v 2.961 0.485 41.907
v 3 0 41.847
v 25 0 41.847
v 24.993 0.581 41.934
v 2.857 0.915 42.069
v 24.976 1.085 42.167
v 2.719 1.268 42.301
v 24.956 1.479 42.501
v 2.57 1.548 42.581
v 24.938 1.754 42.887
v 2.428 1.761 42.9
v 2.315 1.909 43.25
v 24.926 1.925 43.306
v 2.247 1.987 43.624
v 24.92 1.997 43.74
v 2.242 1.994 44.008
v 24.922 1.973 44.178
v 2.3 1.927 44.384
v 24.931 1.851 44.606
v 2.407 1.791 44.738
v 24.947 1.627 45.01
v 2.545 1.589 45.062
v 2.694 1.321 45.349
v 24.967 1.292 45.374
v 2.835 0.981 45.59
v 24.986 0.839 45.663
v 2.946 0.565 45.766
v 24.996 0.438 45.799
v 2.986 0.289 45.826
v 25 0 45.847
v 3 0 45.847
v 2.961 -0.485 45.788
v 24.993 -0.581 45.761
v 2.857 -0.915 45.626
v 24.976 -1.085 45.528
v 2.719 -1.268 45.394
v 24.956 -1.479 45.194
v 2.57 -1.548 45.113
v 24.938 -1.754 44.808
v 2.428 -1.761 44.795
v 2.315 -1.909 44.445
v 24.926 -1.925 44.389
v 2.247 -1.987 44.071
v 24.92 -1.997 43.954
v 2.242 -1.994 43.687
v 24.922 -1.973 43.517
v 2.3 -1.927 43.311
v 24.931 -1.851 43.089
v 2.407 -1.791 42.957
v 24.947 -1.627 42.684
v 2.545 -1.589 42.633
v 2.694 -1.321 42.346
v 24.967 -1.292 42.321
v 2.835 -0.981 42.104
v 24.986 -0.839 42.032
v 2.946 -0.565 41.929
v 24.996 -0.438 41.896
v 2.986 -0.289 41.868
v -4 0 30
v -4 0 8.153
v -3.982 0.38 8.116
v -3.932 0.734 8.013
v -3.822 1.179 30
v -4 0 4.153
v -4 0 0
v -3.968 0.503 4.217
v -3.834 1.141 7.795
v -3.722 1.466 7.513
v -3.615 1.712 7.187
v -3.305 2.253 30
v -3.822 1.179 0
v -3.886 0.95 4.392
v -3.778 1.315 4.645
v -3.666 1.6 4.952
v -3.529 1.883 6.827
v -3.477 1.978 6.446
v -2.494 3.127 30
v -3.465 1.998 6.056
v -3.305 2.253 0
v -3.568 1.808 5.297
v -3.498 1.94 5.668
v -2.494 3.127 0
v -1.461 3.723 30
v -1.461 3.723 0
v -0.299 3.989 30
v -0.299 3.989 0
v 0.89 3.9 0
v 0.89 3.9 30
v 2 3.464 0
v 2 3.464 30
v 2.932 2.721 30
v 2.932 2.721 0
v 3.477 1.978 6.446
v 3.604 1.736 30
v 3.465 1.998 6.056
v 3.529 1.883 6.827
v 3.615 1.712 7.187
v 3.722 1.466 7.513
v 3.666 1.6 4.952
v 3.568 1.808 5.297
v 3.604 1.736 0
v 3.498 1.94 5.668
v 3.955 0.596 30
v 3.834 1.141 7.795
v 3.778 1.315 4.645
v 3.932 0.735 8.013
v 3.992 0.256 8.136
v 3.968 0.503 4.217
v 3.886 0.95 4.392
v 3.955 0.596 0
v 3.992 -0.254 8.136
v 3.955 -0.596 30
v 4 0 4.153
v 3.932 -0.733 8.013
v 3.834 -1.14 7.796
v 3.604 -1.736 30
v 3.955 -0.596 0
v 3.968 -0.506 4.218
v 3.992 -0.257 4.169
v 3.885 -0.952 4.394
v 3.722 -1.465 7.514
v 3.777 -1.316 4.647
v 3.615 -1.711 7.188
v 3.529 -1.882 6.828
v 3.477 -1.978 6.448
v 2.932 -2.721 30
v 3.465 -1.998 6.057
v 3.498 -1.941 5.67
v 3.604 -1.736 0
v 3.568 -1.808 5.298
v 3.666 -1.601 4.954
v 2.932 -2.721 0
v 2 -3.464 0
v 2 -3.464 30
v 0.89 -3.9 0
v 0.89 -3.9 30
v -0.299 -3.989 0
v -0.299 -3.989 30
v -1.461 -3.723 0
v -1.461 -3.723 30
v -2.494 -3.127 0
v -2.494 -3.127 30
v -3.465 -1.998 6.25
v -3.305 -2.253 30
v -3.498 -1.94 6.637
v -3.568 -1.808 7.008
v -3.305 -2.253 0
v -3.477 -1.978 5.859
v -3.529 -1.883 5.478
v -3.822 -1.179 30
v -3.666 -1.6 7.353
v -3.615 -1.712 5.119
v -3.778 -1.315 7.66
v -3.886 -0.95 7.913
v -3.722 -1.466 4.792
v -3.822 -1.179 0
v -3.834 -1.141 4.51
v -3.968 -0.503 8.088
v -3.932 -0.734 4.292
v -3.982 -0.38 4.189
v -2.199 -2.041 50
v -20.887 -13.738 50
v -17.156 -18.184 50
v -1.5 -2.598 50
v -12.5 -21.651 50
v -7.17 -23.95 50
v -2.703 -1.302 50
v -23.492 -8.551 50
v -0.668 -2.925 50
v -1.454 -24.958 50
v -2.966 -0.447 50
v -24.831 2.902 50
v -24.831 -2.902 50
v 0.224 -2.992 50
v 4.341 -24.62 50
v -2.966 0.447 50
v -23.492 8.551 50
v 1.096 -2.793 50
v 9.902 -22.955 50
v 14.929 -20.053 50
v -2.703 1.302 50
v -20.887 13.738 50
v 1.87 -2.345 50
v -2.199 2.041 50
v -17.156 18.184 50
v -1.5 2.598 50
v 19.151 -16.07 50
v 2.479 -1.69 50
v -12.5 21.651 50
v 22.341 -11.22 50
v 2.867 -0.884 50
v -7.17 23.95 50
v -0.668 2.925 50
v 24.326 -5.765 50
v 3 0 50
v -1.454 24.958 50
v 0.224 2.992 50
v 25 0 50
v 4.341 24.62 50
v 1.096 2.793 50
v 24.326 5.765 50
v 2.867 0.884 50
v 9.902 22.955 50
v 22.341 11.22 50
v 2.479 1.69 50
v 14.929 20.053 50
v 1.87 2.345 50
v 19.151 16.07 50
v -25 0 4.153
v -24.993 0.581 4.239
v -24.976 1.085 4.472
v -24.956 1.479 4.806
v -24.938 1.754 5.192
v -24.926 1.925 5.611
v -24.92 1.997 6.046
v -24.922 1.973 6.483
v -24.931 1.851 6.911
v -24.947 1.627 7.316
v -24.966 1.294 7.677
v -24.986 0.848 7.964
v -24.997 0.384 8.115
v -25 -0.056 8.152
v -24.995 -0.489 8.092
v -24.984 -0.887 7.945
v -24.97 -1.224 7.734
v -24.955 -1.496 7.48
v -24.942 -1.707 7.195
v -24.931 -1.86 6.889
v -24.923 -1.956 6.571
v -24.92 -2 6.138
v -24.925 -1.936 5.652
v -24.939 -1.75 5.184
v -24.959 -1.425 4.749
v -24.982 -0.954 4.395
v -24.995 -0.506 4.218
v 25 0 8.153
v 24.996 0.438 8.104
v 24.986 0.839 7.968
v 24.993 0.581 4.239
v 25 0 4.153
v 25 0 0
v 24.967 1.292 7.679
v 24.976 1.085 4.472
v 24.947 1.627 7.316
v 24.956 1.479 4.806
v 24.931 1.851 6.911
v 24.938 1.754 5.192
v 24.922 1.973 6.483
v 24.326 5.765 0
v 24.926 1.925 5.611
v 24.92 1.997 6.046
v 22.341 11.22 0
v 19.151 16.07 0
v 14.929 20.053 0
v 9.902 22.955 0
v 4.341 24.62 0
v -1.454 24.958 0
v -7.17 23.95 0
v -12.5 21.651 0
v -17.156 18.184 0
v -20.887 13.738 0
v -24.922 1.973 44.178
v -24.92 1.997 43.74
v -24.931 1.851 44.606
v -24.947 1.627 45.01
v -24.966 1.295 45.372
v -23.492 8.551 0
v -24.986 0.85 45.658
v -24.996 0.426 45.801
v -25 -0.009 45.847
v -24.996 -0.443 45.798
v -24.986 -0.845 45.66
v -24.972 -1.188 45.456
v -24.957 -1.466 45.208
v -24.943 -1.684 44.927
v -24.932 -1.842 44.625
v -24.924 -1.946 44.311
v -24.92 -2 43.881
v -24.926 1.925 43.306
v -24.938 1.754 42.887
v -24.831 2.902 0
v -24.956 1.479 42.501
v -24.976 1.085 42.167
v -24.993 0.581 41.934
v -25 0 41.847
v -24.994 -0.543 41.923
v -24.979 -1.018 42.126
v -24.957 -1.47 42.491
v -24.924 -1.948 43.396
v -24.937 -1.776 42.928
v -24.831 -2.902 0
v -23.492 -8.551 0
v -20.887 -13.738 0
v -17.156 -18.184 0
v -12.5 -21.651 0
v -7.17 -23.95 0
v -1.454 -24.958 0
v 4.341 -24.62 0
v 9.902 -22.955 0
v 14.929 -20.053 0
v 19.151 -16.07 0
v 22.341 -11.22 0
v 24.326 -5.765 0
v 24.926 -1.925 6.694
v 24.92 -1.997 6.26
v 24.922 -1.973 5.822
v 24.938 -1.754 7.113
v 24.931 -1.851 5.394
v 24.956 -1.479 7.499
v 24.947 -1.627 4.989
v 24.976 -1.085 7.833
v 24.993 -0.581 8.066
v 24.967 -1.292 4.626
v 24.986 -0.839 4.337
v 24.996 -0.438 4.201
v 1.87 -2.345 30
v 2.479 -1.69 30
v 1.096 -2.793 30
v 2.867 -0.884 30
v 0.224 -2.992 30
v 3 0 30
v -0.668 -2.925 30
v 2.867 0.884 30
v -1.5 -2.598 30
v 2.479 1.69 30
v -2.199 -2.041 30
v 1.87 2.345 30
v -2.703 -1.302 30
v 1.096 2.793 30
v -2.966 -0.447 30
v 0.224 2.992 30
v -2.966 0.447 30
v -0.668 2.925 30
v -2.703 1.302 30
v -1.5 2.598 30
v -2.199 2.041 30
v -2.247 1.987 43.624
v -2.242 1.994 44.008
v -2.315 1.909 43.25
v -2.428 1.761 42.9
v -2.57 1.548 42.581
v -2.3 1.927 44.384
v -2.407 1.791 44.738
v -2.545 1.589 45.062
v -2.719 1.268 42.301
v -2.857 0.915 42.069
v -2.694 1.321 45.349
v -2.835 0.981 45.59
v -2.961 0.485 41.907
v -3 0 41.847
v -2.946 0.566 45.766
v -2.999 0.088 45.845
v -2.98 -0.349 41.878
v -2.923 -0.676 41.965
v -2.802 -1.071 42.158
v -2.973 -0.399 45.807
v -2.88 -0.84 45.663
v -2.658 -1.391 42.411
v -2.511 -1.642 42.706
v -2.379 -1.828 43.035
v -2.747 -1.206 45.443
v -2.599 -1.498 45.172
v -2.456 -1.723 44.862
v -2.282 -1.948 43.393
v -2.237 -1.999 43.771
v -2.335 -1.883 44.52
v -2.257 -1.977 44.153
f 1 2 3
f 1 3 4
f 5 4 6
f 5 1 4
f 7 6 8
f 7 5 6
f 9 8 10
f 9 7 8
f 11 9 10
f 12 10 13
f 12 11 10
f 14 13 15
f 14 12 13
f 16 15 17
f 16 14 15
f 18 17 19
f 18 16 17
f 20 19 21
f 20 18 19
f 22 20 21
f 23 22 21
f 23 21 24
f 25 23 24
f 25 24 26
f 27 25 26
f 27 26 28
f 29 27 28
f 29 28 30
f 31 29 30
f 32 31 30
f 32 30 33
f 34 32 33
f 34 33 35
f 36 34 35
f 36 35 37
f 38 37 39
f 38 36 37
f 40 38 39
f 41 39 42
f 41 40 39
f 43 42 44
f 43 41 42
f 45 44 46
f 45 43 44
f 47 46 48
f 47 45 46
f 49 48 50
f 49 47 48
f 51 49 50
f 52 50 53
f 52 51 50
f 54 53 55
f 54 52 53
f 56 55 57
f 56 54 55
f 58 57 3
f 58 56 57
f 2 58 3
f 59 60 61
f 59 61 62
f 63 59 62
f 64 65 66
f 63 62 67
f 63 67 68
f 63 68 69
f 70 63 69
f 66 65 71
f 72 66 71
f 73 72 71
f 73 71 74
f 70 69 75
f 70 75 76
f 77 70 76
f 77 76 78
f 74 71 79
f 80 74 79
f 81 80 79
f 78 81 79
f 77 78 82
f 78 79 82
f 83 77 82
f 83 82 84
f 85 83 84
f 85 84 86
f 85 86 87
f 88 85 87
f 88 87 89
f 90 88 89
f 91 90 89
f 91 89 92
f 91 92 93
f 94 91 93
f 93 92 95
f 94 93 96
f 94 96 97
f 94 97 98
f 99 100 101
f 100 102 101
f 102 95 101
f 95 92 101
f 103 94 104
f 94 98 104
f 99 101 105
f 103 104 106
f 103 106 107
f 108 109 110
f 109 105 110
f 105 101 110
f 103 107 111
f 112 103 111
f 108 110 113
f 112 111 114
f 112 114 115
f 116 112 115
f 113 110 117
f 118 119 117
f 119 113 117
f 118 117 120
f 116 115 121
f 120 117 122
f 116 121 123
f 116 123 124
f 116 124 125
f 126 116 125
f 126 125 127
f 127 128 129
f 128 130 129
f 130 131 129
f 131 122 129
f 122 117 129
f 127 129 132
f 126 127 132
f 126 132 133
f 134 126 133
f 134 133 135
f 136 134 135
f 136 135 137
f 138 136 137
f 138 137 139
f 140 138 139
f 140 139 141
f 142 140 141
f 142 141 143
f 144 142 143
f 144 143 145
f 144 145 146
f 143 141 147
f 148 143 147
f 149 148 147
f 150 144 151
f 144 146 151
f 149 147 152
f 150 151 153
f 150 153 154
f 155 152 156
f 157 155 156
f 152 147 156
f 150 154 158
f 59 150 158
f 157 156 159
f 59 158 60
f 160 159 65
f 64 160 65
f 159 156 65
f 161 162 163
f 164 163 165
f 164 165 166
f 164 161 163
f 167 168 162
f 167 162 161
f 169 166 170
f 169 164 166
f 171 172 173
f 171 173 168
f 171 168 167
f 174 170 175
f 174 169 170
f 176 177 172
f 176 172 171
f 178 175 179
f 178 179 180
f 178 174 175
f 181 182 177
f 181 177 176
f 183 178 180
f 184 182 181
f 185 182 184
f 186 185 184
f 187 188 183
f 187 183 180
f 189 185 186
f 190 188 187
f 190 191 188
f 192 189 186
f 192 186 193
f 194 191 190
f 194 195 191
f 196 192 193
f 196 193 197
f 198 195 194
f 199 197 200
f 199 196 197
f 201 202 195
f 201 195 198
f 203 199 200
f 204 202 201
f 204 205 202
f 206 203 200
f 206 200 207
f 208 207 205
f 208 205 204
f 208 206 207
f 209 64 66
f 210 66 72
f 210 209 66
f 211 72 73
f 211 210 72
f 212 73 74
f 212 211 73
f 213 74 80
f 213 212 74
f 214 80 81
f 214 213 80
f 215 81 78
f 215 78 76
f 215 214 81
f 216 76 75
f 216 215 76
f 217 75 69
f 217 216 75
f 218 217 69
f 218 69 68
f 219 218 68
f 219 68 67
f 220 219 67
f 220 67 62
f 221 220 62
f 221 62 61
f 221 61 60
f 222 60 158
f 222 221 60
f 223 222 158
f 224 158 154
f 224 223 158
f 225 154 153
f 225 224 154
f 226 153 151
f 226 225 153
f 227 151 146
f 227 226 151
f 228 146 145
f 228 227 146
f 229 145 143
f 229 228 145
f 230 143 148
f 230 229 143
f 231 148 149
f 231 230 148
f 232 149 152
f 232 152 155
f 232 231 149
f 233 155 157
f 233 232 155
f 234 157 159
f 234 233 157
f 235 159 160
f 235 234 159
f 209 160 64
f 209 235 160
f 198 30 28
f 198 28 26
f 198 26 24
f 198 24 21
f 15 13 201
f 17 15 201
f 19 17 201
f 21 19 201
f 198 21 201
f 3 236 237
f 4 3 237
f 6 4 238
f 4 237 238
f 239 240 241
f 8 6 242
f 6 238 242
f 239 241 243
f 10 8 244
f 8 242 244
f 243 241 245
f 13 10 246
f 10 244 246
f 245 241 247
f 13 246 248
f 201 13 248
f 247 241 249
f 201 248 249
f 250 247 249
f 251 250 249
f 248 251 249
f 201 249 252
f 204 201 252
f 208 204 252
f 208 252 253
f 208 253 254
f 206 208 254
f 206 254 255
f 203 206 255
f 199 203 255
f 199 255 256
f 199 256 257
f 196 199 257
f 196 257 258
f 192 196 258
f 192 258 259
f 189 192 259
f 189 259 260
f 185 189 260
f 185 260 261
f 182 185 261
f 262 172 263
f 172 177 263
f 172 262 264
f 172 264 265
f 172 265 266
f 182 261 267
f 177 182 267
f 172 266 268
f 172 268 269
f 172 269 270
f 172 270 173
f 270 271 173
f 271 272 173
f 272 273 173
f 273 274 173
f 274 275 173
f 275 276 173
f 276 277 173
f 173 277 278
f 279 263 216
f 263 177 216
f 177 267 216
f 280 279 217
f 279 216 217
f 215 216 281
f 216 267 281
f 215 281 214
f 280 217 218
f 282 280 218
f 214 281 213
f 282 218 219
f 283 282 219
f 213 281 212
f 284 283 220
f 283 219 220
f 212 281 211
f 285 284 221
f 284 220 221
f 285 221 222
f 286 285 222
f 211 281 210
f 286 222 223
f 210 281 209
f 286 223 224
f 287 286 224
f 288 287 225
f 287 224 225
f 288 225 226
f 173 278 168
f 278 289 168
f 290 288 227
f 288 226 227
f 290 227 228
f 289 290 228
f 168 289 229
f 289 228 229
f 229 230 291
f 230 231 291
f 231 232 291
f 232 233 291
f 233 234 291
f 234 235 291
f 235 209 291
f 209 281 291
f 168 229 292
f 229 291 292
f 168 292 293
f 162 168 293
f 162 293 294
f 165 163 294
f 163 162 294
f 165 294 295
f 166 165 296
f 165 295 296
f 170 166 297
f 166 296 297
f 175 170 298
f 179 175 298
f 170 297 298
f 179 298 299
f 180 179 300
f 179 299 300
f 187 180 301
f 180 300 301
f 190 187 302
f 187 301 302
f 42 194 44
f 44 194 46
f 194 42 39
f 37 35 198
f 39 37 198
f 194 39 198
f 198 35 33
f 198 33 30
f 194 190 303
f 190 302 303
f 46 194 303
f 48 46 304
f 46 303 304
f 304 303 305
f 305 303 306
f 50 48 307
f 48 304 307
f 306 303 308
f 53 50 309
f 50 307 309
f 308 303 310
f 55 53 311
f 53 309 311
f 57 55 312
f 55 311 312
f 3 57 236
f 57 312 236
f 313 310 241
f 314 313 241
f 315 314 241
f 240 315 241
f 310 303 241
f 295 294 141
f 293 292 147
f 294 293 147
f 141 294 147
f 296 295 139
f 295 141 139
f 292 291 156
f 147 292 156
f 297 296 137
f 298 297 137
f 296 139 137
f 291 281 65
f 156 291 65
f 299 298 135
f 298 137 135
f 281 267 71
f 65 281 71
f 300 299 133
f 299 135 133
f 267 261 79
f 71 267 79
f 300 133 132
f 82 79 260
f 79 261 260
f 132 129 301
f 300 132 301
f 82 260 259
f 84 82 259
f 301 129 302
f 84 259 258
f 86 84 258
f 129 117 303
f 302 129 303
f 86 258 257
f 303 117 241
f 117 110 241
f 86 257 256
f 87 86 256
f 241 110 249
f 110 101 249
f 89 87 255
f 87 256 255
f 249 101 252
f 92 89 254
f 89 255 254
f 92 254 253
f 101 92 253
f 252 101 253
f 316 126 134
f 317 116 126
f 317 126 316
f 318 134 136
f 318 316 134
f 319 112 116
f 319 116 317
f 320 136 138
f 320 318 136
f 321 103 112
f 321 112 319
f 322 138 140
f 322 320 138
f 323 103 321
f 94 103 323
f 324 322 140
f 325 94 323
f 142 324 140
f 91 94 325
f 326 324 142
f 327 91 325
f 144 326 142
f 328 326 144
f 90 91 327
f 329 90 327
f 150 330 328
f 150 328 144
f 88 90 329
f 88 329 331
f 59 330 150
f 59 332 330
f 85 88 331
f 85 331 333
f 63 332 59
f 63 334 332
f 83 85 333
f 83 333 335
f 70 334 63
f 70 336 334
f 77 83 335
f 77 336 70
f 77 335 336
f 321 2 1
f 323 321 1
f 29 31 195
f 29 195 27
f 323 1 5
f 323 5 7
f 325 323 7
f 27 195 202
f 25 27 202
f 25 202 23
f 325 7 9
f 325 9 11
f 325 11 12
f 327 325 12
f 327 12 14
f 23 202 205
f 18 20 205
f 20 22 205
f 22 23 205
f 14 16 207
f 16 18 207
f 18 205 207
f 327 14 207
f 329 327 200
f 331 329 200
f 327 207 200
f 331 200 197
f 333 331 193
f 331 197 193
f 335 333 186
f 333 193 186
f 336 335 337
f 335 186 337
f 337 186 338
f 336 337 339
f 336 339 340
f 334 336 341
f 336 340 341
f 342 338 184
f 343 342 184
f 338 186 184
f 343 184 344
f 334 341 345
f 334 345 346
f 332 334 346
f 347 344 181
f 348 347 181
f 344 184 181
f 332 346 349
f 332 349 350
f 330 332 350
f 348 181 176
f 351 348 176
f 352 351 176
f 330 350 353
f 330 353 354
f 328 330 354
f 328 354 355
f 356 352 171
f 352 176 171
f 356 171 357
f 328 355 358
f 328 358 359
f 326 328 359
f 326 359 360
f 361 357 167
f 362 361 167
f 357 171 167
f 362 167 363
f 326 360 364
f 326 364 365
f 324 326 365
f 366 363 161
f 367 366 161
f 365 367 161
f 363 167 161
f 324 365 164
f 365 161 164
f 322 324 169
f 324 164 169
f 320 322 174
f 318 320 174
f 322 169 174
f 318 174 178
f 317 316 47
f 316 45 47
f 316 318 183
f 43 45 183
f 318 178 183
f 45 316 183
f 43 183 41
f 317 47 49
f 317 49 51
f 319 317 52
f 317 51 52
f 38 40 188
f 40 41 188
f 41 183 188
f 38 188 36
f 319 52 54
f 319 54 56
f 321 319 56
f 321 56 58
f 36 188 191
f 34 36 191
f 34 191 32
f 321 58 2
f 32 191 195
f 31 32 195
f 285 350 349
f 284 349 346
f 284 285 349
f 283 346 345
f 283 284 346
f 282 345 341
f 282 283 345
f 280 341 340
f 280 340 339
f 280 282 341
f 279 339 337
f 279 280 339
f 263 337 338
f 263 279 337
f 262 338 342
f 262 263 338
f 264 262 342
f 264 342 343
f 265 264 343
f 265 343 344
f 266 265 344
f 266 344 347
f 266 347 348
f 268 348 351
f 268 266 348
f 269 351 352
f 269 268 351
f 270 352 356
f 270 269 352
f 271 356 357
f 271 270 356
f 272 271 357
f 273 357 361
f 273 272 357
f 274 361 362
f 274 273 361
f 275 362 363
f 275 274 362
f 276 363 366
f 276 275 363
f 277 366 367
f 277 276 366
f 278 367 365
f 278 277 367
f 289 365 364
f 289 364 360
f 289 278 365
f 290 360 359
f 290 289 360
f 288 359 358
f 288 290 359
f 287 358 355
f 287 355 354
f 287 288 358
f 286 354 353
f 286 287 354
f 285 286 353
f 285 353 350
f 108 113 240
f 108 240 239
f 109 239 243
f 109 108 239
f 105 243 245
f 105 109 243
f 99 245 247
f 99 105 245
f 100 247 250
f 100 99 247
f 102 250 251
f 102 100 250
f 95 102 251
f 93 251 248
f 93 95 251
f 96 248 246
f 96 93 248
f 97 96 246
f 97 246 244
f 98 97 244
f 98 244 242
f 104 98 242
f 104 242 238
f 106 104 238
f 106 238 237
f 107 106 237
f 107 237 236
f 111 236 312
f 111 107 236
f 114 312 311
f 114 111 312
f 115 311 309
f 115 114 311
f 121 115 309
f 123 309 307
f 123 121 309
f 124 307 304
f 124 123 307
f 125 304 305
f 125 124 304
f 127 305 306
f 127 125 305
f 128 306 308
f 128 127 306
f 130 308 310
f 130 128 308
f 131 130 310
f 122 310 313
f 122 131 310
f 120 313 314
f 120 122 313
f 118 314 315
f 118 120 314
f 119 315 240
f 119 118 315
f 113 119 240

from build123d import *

# Parameters (mm, degrees)
SKETCH1_R               = 25
BOSS_EXTRUDE1_DEPTH     = 50
SKETCH2_R               = 3
CUT_EXTRUDE1_DEPTH      = 20
SKETCH3_R               = 4
CUT_EXTRUDE2_DEPTH      = 30
CUT_EXTRUDE3_DEPTH      = 62.23724357
CUT_EXTRUDE3_DEPTH_BACK = 62.23724357
SKETCH4_R               = 2


with BuildPart() as part:
    # Sketch1 → Boss-Extrude1 (new body)
    with BuildSketch(Plane.XY):
        Circle(SKETCH1_R)
    extrude(amount=BOSS_EXTRUDE1_DEPTH)

    # Sketch2 → Cut-Extrude1 (cut)
    with BuildSketch(Plane.XY.offset(50)):
        Circle(SKETCH2_R)
    extrude(amount=-CUT_EXTRUDE1_DEPTH, mode=Mode.SUBTRACT)

    # Sketch3 → Cut-Extrude2 (cut)
    with BuildSketch(Plane(origin=(0, 0, 0), x_dir=(-1, 0, 0), z_dir=(0, 0, -1))):
        Circle(SKETCH3_R)
    extrude(amount=-CUT_EXTRUDE2_DEPTH, mode=Mode.SUBTRACT)

    # Sketch4 → Cut-Extrude3 (cut, two sides: drawn at the far end of the back side and taken through both)
    with BuildSketch(Plane(origin=(0, 0, 0), x_dir=(0, 0, -1), z_dir=(1, 0, 0)).offset(-CUT_EXTRUDE3_DEPTH_BACK)):
        with Locations((-43.847378844, 0)):
            Circle(SKETCH4_R)
        with Locations((-6.152621156, 0)):
            Circle(SKETCH4_R)
    extrude(amount=CUT_EXTRUDE3_DEPTH + CUT_EXTRUDE3_DEPTH_BACK, mode=Mode.SUBTRACT)


solid = part.part
